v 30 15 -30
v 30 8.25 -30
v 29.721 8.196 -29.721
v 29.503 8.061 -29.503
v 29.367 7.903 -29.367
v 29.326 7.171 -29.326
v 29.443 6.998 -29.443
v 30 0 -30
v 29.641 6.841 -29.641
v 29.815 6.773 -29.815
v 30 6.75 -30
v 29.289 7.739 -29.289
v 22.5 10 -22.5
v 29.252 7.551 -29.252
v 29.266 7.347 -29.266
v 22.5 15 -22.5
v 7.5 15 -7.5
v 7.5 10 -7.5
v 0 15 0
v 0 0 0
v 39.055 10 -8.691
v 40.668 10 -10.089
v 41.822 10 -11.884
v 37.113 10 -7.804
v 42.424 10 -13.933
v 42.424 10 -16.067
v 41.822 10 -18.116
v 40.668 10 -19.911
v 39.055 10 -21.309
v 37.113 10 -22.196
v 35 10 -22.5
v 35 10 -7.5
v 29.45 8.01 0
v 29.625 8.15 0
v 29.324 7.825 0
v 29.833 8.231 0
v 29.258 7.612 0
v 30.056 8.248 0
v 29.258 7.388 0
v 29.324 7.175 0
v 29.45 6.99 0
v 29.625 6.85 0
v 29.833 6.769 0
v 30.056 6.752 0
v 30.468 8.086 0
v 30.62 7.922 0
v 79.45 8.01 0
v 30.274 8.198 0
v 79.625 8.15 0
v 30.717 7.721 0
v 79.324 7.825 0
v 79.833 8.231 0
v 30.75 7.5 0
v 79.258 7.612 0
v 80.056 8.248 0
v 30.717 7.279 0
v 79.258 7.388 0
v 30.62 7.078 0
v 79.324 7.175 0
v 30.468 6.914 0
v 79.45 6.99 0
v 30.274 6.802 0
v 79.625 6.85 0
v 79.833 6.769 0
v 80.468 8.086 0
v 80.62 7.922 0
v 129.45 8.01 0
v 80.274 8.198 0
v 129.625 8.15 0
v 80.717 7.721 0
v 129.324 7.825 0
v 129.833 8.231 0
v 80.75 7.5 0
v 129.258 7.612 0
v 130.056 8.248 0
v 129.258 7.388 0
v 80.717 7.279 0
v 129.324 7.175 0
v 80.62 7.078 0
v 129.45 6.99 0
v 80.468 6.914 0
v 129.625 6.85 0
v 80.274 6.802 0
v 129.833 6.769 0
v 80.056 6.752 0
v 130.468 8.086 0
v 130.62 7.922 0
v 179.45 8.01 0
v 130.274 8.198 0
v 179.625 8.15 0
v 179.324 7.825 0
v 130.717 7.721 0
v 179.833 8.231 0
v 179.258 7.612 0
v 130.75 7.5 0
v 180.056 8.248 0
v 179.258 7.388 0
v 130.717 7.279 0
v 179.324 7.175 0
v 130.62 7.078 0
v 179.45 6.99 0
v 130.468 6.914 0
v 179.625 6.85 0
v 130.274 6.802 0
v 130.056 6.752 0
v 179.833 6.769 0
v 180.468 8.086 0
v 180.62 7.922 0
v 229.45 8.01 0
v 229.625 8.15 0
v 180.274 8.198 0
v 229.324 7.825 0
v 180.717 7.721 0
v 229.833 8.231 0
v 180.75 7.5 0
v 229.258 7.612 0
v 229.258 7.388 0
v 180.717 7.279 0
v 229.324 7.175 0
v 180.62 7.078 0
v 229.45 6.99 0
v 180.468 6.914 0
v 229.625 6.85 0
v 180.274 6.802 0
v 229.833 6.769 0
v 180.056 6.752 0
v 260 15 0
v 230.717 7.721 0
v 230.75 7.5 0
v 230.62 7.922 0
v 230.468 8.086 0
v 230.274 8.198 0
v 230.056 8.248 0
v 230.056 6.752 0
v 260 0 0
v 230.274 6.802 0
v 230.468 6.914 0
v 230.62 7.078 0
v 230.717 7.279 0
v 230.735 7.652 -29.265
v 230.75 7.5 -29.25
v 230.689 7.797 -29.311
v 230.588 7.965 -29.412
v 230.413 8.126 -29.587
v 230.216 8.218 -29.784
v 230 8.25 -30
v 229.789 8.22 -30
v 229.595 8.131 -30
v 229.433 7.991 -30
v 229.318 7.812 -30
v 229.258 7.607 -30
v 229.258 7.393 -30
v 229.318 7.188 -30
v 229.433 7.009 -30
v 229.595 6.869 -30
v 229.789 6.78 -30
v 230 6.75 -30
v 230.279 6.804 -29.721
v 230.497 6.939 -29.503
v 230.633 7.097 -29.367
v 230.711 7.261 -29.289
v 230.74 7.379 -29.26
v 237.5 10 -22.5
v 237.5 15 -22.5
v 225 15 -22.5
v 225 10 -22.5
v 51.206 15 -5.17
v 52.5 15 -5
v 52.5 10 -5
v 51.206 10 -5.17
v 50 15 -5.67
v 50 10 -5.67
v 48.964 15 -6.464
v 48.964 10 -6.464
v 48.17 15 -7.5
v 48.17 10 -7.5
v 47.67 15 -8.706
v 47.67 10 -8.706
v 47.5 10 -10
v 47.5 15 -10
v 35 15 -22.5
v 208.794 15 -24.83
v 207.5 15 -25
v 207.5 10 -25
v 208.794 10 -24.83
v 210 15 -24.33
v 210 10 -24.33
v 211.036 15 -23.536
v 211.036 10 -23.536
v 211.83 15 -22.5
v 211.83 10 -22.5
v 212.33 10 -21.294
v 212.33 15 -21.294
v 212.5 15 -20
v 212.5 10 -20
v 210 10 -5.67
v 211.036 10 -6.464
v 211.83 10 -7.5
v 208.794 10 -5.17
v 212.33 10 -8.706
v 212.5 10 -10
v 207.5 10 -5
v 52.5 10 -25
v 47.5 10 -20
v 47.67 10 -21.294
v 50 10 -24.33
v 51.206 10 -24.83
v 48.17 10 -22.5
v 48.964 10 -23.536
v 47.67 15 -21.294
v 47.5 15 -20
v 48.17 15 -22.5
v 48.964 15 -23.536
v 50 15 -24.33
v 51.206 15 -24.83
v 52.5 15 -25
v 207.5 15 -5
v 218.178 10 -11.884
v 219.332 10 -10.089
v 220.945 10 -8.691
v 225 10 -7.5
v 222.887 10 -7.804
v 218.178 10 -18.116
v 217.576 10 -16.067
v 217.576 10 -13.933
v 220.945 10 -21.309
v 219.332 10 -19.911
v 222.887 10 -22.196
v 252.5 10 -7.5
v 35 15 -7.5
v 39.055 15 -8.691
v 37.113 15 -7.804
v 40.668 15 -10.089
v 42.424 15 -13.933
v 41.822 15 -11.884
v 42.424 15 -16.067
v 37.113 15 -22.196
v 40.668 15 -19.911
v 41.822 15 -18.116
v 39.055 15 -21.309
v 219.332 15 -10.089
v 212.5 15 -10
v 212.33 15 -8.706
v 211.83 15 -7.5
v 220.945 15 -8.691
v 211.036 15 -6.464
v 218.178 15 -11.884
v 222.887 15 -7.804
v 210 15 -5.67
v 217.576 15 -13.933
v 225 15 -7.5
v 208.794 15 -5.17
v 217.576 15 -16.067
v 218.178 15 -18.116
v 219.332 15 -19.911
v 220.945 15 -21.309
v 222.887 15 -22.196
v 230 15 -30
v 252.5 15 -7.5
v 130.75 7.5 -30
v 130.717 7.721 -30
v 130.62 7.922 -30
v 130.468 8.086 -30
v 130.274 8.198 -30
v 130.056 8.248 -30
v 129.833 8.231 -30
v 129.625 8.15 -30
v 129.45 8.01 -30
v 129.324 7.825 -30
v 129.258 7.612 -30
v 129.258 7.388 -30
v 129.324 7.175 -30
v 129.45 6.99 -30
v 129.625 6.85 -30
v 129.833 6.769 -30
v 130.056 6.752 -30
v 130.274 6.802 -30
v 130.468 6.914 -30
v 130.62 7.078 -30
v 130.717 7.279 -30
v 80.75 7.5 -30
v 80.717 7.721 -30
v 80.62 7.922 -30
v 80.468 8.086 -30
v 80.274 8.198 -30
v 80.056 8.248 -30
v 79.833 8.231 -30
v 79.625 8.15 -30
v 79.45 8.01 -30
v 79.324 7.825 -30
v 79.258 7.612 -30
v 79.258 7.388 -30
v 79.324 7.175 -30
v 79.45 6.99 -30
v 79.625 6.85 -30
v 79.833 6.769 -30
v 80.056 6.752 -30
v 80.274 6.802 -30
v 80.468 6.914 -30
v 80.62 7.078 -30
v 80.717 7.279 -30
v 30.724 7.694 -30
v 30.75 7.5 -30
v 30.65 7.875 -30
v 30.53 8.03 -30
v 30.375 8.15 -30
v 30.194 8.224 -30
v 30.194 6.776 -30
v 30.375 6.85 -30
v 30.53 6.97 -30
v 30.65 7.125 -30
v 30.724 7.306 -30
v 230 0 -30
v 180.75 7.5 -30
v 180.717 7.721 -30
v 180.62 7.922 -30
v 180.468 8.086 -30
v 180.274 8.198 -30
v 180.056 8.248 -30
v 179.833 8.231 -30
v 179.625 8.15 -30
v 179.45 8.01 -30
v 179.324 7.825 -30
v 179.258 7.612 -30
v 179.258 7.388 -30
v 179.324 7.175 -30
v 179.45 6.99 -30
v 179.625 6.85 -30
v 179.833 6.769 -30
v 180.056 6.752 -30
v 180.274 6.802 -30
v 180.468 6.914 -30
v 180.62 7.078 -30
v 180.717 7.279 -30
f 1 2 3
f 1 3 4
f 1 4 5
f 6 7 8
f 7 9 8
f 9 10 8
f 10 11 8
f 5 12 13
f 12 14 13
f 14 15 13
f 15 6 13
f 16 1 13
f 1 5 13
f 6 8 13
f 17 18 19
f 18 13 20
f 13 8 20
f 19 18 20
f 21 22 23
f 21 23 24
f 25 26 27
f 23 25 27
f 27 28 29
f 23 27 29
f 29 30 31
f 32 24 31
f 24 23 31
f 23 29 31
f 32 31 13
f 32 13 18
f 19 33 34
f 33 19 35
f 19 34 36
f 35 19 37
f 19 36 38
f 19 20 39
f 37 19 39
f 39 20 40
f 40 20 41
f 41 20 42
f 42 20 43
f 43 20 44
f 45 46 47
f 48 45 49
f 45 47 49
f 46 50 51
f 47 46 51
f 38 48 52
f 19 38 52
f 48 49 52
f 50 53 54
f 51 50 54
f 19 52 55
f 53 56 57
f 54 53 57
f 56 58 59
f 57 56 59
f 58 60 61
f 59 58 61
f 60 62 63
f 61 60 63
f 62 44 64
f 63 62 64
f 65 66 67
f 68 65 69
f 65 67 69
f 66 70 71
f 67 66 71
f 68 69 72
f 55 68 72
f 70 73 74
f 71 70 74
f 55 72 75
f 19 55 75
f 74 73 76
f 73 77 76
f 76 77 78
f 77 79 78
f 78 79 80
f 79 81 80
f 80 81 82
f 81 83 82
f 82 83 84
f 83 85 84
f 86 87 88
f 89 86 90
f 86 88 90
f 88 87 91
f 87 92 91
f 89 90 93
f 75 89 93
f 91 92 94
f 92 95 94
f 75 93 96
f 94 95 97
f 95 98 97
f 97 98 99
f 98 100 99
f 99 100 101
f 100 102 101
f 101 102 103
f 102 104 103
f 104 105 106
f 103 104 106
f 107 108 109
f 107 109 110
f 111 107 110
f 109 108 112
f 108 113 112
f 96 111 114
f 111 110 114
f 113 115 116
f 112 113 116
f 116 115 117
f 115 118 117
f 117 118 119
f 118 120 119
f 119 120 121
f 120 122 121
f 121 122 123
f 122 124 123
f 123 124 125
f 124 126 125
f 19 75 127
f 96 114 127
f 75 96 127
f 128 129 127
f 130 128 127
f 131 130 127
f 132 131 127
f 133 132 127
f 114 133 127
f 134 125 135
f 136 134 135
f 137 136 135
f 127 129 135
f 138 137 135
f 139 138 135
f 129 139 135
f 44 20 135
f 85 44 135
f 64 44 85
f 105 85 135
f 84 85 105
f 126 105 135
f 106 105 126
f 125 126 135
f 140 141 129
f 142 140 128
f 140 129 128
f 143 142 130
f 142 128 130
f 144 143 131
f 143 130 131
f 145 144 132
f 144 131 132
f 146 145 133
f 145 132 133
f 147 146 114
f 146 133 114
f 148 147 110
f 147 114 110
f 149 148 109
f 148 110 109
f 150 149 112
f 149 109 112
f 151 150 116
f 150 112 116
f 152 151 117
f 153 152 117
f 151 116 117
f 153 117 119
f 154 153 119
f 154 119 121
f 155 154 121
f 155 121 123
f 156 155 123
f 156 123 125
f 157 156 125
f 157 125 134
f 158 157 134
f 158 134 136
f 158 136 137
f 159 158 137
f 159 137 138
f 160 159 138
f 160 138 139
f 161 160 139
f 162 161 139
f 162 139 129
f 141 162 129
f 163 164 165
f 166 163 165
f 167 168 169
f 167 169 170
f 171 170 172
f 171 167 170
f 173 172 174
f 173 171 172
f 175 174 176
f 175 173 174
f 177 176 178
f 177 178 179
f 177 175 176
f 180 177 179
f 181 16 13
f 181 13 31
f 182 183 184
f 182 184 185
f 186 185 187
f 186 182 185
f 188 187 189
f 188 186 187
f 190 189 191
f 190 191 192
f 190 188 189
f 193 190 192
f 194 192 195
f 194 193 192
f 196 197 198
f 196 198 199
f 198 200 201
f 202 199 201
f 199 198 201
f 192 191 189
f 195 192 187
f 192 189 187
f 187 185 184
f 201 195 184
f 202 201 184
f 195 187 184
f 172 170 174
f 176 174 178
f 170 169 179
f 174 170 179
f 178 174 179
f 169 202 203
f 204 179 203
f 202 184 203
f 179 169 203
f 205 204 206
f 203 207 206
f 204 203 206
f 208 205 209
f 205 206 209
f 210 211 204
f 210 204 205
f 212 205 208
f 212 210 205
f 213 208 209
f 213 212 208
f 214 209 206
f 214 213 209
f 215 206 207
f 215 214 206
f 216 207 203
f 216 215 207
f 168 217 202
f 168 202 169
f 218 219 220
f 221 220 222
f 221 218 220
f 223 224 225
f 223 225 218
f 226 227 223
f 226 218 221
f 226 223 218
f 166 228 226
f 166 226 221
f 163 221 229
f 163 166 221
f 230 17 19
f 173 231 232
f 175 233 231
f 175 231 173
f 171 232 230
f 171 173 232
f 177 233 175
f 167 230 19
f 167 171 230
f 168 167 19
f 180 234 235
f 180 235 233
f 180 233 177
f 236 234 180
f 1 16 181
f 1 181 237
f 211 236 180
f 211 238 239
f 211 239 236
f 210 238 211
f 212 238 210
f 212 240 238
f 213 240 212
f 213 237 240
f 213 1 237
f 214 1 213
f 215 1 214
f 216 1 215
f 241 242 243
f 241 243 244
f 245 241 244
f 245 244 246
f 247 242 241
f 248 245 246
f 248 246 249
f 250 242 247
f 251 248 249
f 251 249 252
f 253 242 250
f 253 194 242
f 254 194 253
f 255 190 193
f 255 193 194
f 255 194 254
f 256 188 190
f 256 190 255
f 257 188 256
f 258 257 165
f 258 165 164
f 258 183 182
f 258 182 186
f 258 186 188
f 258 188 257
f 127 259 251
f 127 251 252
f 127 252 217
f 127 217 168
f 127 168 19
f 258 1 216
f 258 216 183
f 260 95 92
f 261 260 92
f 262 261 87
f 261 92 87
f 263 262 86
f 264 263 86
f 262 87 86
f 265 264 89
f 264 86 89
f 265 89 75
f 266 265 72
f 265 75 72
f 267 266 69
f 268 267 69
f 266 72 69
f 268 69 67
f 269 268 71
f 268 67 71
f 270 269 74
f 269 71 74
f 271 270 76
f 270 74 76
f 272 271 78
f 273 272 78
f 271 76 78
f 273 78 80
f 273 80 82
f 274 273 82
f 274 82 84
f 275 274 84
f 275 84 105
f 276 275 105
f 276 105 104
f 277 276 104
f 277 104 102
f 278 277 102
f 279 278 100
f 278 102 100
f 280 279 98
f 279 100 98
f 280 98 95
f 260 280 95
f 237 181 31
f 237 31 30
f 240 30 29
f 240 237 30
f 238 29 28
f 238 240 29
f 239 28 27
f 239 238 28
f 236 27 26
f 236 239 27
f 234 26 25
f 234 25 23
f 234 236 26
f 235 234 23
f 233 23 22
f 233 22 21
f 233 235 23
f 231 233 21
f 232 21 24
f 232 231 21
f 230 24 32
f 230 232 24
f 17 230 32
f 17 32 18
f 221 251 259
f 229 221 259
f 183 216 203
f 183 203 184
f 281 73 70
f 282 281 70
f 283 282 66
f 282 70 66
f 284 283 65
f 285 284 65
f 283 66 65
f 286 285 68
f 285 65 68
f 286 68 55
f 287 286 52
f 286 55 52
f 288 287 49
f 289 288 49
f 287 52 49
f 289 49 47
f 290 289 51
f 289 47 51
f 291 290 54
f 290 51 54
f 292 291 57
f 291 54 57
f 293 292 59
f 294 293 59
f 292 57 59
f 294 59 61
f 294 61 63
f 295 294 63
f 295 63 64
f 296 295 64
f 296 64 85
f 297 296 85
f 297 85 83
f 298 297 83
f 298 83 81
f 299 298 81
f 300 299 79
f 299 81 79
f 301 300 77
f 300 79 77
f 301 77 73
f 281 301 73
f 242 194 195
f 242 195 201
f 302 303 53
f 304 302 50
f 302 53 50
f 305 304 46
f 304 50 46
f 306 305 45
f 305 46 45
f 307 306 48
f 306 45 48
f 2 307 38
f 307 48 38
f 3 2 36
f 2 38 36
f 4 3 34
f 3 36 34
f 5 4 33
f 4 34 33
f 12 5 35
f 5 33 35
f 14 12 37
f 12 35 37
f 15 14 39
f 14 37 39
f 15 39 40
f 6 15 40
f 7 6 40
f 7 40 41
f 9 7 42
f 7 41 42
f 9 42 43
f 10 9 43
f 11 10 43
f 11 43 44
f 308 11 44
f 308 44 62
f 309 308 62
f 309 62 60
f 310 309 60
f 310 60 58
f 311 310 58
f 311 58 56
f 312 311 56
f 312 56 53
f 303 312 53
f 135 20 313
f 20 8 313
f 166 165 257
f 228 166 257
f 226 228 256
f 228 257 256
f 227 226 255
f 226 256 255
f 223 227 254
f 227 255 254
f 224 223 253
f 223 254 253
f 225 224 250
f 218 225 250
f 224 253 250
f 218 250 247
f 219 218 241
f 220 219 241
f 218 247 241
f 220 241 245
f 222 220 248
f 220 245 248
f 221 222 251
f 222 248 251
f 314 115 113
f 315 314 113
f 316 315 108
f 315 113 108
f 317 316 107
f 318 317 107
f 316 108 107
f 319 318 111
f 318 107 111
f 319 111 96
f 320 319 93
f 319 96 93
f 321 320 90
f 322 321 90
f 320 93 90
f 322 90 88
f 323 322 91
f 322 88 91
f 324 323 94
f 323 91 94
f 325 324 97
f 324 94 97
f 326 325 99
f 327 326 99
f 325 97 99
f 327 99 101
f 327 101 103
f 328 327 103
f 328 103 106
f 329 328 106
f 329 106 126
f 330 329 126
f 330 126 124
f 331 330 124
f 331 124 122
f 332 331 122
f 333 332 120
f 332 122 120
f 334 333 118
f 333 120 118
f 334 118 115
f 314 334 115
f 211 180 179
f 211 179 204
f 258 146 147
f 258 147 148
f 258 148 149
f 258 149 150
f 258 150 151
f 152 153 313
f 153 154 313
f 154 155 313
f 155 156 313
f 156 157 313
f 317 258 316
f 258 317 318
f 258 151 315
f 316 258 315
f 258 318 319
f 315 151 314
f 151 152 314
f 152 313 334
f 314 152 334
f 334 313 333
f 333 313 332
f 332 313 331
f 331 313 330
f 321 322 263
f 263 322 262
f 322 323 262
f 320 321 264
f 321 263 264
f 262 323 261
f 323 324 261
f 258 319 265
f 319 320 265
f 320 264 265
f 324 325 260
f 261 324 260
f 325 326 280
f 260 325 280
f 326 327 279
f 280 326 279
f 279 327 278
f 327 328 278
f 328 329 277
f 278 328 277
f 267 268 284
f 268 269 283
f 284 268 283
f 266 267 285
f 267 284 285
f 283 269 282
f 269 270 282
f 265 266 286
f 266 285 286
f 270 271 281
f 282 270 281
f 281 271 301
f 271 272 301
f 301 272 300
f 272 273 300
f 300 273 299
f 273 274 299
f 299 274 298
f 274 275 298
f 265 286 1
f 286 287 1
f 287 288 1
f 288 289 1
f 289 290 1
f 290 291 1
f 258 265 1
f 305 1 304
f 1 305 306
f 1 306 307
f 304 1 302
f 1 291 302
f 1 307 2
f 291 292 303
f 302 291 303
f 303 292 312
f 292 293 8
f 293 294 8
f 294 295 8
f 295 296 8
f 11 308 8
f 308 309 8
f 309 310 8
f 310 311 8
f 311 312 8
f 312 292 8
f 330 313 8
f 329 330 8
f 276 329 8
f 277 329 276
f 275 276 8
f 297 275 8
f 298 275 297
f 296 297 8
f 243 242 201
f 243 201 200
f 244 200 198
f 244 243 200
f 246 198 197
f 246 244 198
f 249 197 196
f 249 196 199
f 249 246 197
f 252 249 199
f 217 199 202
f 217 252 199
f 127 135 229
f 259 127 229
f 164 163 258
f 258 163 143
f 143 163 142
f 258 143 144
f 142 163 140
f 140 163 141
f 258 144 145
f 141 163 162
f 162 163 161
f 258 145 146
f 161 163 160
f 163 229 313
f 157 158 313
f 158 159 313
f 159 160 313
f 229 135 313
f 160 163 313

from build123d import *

# Parameters (mm, degrees)
BOSS_EXTRUDE1_DEPTH = 15
CUT_EXTRUDE1_DEPTH  = 5
SKETCH3_R           = 0.75
CUT_EXTRUDE2_DEPTH  = 30
CUT_EXTRUDE3_DEPTH  = 5


with BuildPart() as part:
    # Sketch1 → Boss-Extrude1 (new body)
    with BuildSketch(Plane(origin=(0, 0, 0), x_dir=(1, 0, 0), z_dir=(0, 1, 0))):
        Polygon((0, 0), (260, 0), (230, 30), (30, 30), align=None)
    extrude(amount=BOSS_EXTRUDE1_DEPTH)

    # Sketch2 → Cut-Extrude1 (cut)
    with BuildSketch(Plane(origin=(0, 15, 0), x_dir=(1, 0, 0), z_dir=(0, 1, 0))):
        with BuildLine():
            Line((-5, 22.5), (35, 22.5))
            ThreePointArc((35, 22.5), (42.5, 15), (35, 7.5))
            Line((35, 7.5), (-5, 7.5))
            ThreePointArc((-5, 7.5), (-12.5, 15), (-5, 22.5))
        make_face()
        with BuildLine():
            Line((265, 22.5), (225, 22.5))
            ThreePointArc((225, 22.5), (217.5, 15), (225, 7.5))
            Line((225, 7.5), (265, 7.5))
            ThreePointArc((265, 7.5), (272.5, 15), (265, 22.5))
        make_face()
    extrude(amount=-CUT_EXTRUDE1_DEPTH, mode=Mode.SUBTRACT)

    # Sketch3 → Cut-Extrude2 (cut)
    with BuildSketch(Plane.XY):
        with Locations((130, 7.5)):
            Circle(SKETCH3_R)
        with Locations((180, 7.5)):
            Circle(SKETCH3_R)
        with Locations((230, 7.5)):
            Circle(SKETCH3_R)
        with Locations((80, 7.5)):
            Circle(SKETCH3_R)
        with Locations((30, 7.5)):
            Circle(SKETCH3_R)
    extrude(amount=-CUT_EXTRUDE2_DEPTH, mode=Mode.SUBTRACT)

    # Sketch4 → Cut-Extrude3 (cut)
    with BuildSketch(Plane(origin=(0, 15, 0), x_dir=(1, 0, 0), z_dir=(0, 1, 0))):
        with BuildLine():
            Line((52.5, 25), (207.5, 25))
            ThreePointArc((207.5, 25), (211.035533906, 23.535533906), (212.5, 20))
            Line((212.5, 20), (212.5, 10))
            ThreePointArc((212.5, 10), (211.035533906, 6.464466094), (207.5, 5))
            Line((207.5, 5), (52.5, 5))
            ThreePointArc((52.5, 5), (48.964466094, 6.464466094), (47.5, 10))
            Line((47.5, 10), (47.5, 20))
            ThreePointArc((47.5, 20), (48.964466094, 23.535533906), (52.5, 25))
        make_face()
    extrude(amount=-CUT_EXTRUDE3_DEPTH, mode=Mode.SUBTRACT)


solid = part.part
